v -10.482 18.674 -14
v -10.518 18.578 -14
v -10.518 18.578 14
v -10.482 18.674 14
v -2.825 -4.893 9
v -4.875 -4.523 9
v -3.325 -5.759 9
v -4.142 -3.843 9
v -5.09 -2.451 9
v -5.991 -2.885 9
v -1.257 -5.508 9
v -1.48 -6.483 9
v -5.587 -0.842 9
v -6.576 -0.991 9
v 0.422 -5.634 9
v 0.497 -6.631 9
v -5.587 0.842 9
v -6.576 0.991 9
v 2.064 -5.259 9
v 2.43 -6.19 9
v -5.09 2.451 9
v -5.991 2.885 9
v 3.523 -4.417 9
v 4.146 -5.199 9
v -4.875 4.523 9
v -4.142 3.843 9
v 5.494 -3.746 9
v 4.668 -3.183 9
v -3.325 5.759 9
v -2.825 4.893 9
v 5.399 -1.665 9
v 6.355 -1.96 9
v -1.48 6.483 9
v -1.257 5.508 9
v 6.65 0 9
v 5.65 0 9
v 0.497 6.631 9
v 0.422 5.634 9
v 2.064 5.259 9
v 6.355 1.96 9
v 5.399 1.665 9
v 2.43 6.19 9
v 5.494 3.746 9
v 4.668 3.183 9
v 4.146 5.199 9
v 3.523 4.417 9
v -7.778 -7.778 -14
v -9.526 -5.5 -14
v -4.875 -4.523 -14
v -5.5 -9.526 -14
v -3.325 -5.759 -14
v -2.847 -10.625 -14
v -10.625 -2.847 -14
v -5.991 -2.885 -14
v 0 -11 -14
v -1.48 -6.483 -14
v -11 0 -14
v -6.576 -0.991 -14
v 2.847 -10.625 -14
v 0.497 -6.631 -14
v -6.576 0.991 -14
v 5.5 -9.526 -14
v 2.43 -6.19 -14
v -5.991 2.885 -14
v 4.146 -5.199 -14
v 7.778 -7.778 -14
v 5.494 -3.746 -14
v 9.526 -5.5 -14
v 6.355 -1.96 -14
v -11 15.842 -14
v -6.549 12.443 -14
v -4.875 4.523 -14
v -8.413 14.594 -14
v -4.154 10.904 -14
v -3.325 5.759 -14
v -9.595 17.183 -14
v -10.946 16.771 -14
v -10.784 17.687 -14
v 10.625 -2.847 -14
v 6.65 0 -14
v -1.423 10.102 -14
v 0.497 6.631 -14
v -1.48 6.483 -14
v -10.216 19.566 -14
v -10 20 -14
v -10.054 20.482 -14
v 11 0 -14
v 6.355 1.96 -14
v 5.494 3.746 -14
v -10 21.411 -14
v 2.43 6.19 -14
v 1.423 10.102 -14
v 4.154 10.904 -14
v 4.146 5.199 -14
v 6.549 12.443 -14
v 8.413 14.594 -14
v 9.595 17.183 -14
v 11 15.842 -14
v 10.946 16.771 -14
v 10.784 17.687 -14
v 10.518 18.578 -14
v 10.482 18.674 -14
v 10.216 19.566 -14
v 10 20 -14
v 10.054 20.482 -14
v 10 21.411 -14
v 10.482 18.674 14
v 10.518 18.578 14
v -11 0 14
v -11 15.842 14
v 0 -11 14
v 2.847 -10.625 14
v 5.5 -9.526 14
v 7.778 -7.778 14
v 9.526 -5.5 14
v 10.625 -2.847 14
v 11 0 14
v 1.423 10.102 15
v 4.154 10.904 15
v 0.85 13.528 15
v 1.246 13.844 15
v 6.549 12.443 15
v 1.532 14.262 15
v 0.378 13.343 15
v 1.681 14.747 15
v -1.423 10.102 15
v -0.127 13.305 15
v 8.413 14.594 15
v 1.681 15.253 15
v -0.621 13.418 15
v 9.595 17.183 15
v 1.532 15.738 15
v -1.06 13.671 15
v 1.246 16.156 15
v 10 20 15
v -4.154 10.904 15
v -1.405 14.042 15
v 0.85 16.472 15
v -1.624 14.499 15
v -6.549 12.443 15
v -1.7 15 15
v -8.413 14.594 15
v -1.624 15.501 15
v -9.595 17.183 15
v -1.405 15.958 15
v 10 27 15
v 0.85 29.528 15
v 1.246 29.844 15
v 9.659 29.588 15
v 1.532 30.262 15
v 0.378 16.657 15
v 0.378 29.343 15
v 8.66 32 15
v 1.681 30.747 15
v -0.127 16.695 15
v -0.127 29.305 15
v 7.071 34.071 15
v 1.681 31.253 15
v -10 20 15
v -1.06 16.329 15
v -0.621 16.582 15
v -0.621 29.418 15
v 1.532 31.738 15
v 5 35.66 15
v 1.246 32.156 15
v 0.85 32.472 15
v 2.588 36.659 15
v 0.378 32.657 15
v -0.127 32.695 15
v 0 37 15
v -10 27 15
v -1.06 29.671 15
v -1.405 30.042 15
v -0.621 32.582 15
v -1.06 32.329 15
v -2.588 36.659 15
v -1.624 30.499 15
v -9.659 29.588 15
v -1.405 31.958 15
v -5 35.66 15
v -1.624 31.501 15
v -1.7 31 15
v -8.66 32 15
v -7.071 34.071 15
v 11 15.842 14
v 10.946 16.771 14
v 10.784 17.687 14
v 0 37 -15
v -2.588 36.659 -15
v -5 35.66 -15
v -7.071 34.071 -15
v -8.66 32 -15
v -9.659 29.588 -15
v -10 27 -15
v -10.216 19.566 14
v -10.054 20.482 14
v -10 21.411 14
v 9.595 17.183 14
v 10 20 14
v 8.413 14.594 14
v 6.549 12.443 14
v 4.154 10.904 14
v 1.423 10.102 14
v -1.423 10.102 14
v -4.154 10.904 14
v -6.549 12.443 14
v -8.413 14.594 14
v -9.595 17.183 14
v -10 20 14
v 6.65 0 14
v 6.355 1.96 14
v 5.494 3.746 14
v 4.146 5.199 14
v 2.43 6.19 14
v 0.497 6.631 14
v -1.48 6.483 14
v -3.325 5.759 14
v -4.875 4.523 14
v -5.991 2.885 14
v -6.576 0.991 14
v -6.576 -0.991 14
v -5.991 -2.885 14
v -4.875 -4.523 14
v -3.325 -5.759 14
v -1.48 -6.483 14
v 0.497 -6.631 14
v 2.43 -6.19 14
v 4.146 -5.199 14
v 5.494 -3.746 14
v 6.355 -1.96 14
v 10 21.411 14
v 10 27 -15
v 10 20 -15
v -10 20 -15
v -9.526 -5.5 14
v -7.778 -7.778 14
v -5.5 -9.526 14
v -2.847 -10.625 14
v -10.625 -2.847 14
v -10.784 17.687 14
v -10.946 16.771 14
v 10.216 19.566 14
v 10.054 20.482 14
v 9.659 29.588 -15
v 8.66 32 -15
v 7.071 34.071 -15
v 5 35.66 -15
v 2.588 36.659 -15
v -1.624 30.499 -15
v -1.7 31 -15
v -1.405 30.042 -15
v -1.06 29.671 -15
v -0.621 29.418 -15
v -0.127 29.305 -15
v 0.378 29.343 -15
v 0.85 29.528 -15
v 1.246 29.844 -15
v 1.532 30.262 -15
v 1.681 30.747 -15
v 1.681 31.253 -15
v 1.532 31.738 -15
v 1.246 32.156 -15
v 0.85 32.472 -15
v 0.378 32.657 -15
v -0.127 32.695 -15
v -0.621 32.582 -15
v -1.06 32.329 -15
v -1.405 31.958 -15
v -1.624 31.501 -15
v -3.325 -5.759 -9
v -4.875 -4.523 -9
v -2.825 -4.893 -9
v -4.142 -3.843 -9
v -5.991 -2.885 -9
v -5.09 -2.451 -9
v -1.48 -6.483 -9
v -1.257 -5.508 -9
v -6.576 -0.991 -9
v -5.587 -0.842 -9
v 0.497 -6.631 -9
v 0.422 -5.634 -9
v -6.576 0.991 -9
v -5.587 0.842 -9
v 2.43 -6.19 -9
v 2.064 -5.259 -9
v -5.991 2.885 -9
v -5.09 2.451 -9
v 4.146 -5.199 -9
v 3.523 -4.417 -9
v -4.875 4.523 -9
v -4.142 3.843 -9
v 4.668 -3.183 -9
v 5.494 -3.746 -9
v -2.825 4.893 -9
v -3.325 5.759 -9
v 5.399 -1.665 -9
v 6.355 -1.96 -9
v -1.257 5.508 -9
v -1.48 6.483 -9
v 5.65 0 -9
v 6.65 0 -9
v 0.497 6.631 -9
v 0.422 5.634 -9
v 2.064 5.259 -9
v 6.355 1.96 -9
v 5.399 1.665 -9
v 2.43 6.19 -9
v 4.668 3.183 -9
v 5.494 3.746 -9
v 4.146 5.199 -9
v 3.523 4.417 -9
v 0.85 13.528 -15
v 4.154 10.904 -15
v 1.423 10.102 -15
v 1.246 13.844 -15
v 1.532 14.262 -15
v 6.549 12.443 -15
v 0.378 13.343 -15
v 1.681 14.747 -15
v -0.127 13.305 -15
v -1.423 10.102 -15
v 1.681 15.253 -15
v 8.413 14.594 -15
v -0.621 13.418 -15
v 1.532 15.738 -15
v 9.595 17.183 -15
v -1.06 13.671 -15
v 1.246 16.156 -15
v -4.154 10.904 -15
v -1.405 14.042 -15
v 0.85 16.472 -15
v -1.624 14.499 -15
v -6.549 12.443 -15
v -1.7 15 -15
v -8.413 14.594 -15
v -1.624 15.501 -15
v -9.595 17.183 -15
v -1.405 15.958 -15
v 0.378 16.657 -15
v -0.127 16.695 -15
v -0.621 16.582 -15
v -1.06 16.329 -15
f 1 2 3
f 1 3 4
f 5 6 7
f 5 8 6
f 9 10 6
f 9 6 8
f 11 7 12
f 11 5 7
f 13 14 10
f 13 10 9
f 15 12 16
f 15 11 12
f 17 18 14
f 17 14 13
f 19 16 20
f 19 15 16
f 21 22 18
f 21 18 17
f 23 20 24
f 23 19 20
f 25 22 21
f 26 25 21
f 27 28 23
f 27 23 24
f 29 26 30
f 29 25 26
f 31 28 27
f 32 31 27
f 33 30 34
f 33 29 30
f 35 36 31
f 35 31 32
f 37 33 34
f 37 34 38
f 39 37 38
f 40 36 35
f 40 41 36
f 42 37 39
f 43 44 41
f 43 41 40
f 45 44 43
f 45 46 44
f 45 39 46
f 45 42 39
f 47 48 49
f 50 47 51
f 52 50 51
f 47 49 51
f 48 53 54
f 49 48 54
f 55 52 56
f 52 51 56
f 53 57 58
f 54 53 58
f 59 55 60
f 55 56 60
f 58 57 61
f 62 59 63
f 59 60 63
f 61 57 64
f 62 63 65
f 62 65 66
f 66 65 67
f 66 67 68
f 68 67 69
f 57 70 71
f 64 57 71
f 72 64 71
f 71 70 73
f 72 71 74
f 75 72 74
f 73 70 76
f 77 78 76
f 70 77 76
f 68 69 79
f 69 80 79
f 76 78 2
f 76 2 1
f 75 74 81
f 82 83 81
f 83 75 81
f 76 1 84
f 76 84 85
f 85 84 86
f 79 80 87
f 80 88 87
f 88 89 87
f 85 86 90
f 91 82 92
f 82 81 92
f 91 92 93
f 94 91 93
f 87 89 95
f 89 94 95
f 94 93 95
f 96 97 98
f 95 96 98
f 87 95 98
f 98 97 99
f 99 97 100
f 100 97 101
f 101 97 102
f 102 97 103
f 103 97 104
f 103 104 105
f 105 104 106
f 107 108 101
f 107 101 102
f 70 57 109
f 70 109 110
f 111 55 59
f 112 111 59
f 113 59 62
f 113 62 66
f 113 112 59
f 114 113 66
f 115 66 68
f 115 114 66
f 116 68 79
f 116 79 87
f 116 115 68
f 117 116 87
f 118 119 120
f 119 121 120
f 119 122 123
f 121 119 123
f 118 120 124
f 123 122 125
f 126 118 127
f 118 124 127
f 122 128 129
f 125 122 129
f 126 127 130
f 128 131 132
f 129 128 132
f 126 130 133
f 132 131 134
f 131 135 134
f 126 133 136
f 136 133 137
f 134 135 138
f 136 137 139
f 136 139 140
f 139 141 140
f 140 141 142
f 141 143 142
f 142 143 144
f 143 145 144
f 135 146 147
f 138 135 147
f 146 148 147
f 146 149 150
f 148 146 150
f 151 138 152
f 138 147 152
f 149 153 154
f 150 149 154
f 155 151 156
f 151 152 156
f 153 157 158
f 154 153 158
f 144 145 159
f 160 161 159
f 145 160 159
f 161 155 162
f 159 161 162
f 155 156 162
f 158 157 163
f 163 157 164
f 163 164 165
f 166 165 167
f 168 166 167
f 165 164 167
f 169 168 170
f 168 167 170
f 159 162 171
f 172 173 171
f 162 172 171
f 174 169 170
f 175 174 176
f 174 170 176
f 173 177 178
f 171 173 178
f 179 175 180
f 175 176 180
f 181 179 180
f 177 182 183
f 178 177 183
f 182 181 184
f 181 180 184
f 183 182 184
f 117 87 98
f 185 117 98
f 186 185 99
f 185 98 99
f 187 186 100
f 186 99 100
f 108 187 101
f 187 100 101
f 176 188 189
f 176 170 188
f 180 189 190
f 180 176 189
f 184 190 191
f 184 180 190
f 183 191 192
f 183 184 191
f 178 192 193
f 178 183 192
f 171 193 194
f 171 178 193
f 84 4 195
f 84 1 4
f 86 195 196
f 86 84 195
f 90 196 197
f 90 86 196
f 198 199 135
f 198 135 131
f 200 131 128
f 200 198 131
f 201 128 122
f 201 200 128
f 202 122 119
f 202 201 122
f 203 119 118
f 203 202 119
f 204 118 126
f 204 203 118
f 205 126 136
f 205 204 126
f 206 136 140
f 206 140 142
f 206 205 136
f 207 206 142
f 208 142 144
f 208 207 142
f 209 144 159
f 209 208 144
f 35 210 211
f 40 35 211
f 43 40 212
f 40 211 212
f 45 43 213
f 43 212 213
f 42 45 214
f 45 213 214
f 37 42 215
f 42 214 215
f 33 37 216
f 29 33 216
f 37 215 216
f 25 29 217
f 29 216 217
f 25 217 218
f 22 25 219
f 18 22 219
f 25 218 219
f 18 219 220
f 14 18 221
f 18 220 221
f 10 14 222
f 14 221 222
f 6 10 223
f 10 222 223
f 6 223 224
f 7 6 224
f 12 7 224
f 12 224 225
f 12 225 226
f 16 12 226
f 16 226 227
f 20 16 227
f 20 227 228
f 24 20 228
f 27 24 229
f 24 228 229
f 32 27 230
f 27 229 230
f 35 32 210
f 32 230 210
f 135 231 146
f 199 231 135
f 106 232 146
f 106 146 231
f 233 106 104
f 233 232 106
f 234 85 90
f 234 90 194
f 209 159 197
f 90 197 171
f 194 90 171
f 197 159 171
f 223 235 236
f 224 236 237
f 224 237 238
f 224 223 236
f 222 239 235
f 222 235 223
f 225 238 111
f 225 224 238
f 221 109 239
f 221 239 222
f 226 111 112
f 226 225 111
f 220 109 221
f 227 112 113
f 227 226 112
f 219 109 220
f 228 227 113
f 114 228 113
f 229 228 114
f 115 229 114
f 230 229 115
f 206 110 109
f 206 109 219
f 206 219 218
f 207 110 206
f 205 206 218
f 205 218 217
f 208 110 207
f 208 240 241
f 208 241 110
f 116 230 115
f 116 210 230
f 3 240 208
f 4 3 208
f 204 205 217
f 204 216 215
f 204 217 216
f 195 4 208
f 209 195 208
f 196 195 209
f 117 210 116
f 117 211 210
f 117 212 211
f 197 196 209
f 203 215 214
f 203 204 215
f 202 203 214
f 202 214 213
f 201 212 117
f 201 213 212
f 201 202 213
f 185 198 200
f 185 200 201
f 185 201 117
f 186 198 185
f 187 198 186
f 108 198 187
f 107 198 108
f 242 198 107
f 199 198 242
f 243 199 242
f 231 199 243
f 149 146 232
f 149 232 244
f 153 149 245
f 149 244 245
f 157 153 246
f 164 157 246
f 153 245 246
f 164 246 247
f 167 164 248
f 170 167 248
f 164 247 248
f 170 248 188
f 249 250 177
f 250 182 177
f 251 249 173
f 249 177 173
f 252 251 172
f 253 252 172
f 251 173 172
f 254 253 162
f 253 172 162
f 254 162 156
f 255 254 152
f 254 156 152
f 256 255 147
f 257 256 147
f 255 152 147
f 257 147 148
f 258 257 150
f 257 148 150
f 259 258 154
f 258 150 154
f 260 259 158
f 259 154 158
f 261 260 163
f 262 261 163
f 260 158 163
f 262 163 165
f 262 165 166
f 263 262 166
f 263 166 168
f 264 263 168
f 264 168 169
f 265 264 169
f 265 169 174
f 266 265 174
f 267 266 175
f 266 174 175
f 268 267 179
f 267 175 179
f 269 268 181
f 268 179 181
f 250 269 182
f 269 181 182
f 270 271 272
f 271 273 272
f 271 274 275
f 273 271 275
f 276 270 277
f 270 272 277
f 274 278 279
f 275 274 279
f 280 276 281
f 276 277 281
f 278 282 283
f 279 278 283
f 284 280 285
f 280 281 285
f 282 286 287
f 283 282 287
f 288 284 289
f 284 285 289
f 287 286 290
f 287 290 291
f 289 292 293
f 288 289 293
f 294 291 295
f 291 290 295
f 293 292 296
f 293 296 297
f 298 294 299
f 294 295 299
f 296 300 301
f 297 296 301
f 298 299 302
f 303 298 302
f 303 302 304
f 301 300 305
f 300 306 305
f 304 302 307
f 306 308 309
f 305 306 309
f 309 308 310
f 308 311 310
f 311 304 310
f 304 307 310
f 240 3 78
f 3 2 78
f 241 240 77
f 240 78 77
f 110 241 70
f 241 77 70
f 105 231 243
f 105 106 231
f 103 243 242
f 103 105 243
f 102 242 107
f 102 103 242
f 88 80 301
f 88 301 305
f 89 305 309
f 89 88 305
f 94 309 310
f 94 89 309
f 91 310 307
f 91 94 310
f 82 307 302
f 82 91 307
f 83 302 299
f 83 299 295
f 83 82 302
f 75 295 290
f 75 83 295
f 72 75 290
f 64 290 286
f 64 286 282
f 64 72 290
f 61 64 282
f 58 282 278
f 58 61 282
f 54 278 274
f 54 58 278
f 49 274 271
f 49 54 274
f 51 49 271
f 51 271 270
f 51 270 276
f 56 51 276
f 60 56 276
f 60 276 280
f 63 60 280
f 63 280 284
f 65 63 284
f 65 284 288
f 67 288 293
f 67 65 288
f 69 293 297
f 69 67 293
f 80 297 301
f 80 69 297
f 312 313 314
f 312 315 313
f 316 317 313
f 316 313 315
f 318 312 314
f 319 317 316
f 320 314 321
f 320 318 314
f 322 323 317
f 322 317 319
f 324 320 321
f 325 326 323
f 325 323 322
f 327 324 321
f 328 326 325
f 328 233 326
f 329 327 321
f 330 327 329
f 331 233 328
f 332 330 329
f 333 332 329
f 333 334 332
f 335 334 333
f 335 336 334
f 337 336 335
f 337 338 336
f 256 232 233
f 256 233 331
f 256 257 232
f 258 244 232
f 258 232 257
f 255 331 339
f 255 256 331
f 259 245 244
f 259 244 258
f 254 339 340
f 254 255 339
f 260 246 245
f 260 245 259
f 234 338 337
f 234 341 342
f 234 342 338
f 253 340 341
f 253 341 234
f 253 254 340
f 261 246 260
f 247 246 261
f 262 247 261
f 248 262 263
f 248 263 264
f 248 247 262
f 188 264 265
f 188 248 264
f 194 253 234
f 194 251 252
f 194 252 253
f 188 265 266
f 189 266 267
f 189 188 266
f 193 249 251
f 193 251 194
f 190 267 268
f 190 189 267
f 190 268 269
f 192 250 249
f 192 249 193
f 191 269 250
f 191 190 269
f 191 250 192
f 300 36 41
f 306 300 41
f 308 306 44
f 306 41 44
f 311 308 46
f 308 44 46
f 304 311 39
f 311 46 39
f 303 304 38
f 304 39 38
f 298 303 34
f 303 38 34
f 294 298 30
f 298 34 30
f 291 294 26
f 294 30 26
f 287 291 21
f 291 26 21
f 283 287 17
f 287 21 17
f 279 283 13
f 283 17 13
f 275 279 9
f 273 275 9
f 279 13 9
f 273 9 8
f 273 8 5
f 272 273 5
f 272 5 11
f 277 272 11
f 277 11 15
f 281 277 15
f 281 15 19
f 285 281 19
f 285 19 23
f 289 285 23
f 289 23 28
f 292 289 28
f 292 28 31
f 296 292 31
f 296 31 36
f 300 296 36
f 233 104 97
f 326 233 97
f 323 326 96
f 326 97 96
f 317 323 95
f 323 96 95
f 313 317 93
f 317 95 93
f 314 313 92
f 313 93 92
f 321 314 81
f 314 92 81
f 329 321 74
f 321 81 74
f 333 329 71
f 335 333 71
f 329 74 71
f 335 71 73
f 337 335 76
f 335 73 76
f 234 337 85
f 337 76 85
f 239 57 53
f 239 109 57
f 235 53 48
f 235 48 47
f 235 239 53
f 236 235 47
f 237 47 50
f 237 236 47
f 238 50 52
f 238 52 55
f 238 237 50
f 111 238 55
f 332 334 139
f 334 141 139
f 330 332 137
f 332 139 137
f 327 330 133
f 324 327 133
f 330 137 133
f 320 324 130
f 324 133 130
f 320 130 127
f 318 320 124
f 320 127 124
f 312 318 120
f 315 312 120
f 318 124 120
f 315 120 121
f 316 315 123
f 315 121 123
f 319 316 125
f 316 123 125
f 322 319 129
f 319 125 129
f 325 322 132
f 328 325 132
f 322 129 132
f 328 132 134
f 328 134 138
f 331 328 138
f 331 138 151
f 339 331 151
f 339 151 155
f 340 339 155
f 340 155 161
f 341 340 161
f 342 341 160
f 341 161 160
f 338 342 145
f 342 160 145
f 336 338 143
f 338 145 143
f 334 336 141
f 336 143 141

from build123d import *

# Parameters (mm, degrees)
EXTRUDE_537_DEPTH      = 14
EXTRUDE_537_DEPTH_BACK = 14
SKETCH_1_W             = 22
SKETCH_1_H             = 48
SKETCH_2_R             = 6.65
CUT_EXTRUDE_717_DEPTH  = 5
SKETCH_4_R             = 5.65
CUT_EXTRUDE_848_DEPTH  = 45.933283877
FILLET_1_R             = 11
SKETCH_5_R             = 1.7
CUT_EXTRUDE_1388_DEPTH = 48.68647607
SKETCH_9_R             = 1.7
EXTRUDE_1991_DEPTH     = 1
CUT_EXTRUDE_2402_REACH = 50.28
FILLET_2_R             = 8
FILLET_3_R             = 10


with BuildPart() as part:
    # Эскиз1 → Extrude 537 (new, two sides: drawn at the far end of the back side and taken through both)
    with BuildSketch(Plane.XY.offset(-EXTRUDE_537_DEPTH_BACK)):
        with Locations((0, 13)):
            Rectangle(SKETCH_1_W, SKETCH_1_H)
    extrude(amount=EXTRUDE_537_DEPTH + EXTRUDE_537_DEPTH_BACK)

    # Эскиз2 → Cut-Extrude 717 (cut)
    with BuildSketch(Plane.XY.offset(14)):
        Circle(SKETCH_2_R)
    cut_extrude_717 = extrude(amount=-CUT_EXTRUDE_717_DEPTH, mode=Mode.SUBTRACT)

    # Эскиз4 → Cut-Extrude 848 (cut, through all)
    with BuildSketch(Plane.XY.offset(9)):
        Circle(SKETCH_4_R)
    extrude(amount=-CUT_EXTRUDE_848_DEPTH, mode=Mode.SUBTRACT)

    # Зеркальное отражение2: Cut-Extrude 717 across plane
    add(cut_extrude_717.mirror(Plane.XY), mode=Mode.SUBTRACT)

    # Скругление1
    fillet_1_edges = [part.edges().sort_by_distance(p)[0] for p in [
        (11, -11, 0),
        (-11, -11, 0),
    ]]
    fillet(fillet_1_edges, radius=FILLET_1_R - 0.0001)  # a hair under: the kernel refuses the full size

    # Эскиз5 → Cut-Extrude 1388 (cut, through all)
    with BuildSketch(Plane(origin=(0, 0, -14), x_dir=(-1, 0, 0), z_dir=(0, 0, -1))):
        with Locations((0, 31)):
            Circle(SKETCH_5_R)
        with Locations((0, 15)):
            Circle(SKETCH_5_R)
    extrude(amount=-CUT_EXTRUDE_1388_DEPTH, mode=Mode.SUBTRACT)

    # Эскиз9 → Extrude 1991 (add)
    with BuildSketch(Plane.XY.offset(14)):
        with BuildLine():
            Line((-10, 37), (10, 37))
            Line((10, 37), (10, 20))
            ThreePointArc((10, 20), (0, 10), (-10, 20))
            Line((-10, 20), (-10, 37))
        make_face()
        with Locations(Location((0, 15, 0), (0, 0, 180))):
            Circle(SKETCH_9_R, mode=Mode.SUBTRACT)
        with Locations(Location((0, 31, 0), (0, 0, 180))):
            Circle(SKETCH_9_R, mode=Mode.SUBTRACT)
    extrude_1991 = extrude(amount=EXTRUDE_1991_DEPTH)

    # Зеркальное отражение1: Extrude 1991 across plane
    add(extrude_1991.mirror(Plane.XY))

    # Эскиз10 → Cut-Extrude 2402 (cut, up to next)
    with BuildSketch(Plane.XY.offset(14), mode=Mode.PRIVATE) as cut_extrude_2402_sk1:
        Polygon((-10, 37), (-11, 37), (-11, 17.252522581), (-10, 20), align=None)
    cut_extrude_2402_tool1 = extrude(cut_extrude_2402_sk1.sketch, amount=-CUT_EXTRUDE_2402_REACH, mode=Mode.PRIVATE) & part.part
    # Эскиз10 → Cut-Extrude 2402 (cut, up to next)
    with BuildSketch(Plane.XY.offset(14), mode=Mode.PRIVATE) as cut_extrude_2402_sk2:
        Polygon((11, 17.252522581), (10, 20), (10, 37), (11, 37), align=None)
    cut_extrude_2402_tool2 = extrude(cut_extrude_2402_sk2.sketch, amount=-CUT_EXTRUDE_2402_REACH, mode=Mode.PRIVATE) & part.part
    add(cut_extrude_2402_tool1.solids().sort_by_distance((-10.512461, 27.796012, 14))[0], mode=Mode.SUBTRACT)
    add(cut_extrude_2402_tool2.solids().sort_by_distance((10.512461, 27.796012, 14))[0], mode=Mode.SUBTRACT)

    # Скругление2
    fillet_2_edges = [part.edges().sort_by_distance(p)[0] for p in [
        (11, 17.252522581, 0),
        (10, 20, 0),
        (-10, 20, 0),
        (-11, 17.252522581, 0),
    ]]
    fillet(fillet_2_edges, radius=FILLET_2_R)

    # Скругление3
    fillet_3_edges = [part.edges().sort_by_distance(p)[0] for p in [
        (-10, 37, 0),
        (10, 37, 0),
    ]]
    fillet(fillet_3_edges, radius=FILLET_3_R - 0.0001)  # a hair under: the kernel refuses the full size


solid = part.part
